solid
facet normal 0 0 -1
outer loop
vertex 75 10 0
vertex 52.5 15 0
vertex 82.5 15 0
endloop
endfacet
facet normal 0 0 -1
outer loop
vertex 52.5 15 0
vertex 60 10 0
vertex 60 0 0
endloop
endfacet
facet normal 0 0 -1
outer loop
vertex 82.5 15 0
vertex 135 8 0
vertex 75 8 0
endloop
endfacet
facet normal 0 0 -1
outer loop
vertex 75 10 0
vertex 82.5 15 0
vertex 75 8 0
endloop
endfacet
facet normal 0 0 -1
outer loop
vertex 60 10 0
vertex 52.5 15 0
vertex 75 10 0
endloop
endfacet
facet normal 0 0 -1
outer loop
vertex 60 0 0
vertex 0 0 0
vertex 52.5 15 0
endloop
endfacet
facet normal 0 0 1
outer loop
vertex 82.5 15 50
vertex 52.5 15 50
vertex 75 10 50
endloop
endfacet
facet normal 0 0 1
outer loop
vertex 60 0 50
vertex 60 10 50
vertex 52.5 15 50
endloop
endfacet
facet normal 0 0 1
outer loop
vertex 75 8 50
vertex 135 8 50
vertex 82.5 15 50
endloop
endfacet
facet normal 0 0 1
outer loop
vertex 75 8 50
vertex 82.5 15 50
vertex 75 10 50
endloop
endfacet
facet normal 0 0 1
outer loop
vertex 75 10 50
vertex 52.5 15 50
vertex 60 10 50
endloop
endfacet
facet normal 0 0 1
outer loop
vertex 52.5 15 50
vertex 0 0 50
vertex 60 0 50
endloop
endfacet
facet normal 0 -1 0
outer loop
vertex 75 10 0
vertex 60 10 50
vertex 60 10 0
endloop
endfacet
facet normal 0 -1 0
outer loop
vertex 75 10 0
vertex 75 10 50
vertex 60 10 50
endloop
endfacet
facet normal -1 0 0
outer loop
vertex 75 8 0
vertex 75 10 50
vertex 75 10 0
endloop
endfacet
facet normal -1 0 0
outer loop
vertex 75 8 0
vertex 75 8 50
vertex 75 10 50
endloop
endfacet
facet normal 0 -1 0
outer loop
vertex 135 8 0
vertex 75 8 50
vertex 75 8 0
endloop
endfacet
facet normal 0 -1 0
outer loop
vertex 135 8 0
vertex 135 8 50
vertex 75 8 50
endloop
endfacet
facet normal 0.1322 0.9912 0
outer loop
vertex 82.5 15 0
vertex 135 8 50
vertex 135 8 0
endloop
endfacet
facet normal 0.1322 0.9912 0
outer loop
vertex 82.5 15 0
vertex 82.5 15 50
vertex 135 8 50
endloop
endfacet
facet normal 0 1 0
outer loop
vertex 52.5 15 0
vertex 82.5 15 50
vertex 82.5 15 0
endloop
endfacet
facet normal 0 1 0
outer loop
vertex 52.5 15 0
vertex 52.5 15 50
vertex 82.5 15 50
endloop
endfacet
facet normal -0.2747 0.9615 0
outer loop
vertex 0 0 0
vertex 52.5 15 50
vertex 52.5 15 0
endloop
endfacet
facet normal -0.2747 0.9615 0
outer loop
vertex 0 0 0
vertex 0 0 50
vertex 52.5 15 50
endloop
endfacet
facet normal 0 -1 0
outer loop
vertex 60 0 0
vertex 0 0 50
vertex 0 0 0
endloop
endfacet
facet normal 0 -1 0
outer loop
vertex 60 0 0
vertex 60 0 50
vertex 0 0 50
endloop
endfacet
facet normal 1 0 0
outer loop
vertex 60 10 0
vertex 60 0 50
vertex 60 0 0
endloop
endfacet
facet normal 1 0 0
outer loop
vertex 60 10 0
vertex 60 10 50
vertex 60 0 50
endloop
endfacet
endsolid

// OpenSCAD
// Параметры (можешь менять под свои размеры)
A = 60;   // длина трапа на полу (синий участок)
B = 60;   // длина трапа на ковре (оранжевый участок)
C = 10;   // толщина ковра с каймой
D = 15;    // ширина каймы
E = 2;    // выступ каймы над ковром
F = 5; //толщина мостика
G = 30; //длина мостика
width = 50; // ширина всего трапа (перпендикулярно профилю)

// Профиль трапа (справа налево)
points = [
    [0, 0],                 // 0 — левый нижний (пол)
    [A, 0],                 // 1 — начало выреза
    [A, C],                 // 2 — вертикальный вырез вверх
    [A + D, C],             // 3 — горизонтальный вырез под каймой
    [A + D, C - E],         // 4 — выход на ковёр
    [A + D + B, C-E],         // 5 — правый верхний (на ковре)
    [(A + D + B)/2 + G/2, C+F],          // 6 — правый нижний (низ ковра)
    [(A + D + B)/2 - G/2, C+F],
];



// Экструдируем профиль в 3D
linear_extrude(height=width)
    polygon(points);
